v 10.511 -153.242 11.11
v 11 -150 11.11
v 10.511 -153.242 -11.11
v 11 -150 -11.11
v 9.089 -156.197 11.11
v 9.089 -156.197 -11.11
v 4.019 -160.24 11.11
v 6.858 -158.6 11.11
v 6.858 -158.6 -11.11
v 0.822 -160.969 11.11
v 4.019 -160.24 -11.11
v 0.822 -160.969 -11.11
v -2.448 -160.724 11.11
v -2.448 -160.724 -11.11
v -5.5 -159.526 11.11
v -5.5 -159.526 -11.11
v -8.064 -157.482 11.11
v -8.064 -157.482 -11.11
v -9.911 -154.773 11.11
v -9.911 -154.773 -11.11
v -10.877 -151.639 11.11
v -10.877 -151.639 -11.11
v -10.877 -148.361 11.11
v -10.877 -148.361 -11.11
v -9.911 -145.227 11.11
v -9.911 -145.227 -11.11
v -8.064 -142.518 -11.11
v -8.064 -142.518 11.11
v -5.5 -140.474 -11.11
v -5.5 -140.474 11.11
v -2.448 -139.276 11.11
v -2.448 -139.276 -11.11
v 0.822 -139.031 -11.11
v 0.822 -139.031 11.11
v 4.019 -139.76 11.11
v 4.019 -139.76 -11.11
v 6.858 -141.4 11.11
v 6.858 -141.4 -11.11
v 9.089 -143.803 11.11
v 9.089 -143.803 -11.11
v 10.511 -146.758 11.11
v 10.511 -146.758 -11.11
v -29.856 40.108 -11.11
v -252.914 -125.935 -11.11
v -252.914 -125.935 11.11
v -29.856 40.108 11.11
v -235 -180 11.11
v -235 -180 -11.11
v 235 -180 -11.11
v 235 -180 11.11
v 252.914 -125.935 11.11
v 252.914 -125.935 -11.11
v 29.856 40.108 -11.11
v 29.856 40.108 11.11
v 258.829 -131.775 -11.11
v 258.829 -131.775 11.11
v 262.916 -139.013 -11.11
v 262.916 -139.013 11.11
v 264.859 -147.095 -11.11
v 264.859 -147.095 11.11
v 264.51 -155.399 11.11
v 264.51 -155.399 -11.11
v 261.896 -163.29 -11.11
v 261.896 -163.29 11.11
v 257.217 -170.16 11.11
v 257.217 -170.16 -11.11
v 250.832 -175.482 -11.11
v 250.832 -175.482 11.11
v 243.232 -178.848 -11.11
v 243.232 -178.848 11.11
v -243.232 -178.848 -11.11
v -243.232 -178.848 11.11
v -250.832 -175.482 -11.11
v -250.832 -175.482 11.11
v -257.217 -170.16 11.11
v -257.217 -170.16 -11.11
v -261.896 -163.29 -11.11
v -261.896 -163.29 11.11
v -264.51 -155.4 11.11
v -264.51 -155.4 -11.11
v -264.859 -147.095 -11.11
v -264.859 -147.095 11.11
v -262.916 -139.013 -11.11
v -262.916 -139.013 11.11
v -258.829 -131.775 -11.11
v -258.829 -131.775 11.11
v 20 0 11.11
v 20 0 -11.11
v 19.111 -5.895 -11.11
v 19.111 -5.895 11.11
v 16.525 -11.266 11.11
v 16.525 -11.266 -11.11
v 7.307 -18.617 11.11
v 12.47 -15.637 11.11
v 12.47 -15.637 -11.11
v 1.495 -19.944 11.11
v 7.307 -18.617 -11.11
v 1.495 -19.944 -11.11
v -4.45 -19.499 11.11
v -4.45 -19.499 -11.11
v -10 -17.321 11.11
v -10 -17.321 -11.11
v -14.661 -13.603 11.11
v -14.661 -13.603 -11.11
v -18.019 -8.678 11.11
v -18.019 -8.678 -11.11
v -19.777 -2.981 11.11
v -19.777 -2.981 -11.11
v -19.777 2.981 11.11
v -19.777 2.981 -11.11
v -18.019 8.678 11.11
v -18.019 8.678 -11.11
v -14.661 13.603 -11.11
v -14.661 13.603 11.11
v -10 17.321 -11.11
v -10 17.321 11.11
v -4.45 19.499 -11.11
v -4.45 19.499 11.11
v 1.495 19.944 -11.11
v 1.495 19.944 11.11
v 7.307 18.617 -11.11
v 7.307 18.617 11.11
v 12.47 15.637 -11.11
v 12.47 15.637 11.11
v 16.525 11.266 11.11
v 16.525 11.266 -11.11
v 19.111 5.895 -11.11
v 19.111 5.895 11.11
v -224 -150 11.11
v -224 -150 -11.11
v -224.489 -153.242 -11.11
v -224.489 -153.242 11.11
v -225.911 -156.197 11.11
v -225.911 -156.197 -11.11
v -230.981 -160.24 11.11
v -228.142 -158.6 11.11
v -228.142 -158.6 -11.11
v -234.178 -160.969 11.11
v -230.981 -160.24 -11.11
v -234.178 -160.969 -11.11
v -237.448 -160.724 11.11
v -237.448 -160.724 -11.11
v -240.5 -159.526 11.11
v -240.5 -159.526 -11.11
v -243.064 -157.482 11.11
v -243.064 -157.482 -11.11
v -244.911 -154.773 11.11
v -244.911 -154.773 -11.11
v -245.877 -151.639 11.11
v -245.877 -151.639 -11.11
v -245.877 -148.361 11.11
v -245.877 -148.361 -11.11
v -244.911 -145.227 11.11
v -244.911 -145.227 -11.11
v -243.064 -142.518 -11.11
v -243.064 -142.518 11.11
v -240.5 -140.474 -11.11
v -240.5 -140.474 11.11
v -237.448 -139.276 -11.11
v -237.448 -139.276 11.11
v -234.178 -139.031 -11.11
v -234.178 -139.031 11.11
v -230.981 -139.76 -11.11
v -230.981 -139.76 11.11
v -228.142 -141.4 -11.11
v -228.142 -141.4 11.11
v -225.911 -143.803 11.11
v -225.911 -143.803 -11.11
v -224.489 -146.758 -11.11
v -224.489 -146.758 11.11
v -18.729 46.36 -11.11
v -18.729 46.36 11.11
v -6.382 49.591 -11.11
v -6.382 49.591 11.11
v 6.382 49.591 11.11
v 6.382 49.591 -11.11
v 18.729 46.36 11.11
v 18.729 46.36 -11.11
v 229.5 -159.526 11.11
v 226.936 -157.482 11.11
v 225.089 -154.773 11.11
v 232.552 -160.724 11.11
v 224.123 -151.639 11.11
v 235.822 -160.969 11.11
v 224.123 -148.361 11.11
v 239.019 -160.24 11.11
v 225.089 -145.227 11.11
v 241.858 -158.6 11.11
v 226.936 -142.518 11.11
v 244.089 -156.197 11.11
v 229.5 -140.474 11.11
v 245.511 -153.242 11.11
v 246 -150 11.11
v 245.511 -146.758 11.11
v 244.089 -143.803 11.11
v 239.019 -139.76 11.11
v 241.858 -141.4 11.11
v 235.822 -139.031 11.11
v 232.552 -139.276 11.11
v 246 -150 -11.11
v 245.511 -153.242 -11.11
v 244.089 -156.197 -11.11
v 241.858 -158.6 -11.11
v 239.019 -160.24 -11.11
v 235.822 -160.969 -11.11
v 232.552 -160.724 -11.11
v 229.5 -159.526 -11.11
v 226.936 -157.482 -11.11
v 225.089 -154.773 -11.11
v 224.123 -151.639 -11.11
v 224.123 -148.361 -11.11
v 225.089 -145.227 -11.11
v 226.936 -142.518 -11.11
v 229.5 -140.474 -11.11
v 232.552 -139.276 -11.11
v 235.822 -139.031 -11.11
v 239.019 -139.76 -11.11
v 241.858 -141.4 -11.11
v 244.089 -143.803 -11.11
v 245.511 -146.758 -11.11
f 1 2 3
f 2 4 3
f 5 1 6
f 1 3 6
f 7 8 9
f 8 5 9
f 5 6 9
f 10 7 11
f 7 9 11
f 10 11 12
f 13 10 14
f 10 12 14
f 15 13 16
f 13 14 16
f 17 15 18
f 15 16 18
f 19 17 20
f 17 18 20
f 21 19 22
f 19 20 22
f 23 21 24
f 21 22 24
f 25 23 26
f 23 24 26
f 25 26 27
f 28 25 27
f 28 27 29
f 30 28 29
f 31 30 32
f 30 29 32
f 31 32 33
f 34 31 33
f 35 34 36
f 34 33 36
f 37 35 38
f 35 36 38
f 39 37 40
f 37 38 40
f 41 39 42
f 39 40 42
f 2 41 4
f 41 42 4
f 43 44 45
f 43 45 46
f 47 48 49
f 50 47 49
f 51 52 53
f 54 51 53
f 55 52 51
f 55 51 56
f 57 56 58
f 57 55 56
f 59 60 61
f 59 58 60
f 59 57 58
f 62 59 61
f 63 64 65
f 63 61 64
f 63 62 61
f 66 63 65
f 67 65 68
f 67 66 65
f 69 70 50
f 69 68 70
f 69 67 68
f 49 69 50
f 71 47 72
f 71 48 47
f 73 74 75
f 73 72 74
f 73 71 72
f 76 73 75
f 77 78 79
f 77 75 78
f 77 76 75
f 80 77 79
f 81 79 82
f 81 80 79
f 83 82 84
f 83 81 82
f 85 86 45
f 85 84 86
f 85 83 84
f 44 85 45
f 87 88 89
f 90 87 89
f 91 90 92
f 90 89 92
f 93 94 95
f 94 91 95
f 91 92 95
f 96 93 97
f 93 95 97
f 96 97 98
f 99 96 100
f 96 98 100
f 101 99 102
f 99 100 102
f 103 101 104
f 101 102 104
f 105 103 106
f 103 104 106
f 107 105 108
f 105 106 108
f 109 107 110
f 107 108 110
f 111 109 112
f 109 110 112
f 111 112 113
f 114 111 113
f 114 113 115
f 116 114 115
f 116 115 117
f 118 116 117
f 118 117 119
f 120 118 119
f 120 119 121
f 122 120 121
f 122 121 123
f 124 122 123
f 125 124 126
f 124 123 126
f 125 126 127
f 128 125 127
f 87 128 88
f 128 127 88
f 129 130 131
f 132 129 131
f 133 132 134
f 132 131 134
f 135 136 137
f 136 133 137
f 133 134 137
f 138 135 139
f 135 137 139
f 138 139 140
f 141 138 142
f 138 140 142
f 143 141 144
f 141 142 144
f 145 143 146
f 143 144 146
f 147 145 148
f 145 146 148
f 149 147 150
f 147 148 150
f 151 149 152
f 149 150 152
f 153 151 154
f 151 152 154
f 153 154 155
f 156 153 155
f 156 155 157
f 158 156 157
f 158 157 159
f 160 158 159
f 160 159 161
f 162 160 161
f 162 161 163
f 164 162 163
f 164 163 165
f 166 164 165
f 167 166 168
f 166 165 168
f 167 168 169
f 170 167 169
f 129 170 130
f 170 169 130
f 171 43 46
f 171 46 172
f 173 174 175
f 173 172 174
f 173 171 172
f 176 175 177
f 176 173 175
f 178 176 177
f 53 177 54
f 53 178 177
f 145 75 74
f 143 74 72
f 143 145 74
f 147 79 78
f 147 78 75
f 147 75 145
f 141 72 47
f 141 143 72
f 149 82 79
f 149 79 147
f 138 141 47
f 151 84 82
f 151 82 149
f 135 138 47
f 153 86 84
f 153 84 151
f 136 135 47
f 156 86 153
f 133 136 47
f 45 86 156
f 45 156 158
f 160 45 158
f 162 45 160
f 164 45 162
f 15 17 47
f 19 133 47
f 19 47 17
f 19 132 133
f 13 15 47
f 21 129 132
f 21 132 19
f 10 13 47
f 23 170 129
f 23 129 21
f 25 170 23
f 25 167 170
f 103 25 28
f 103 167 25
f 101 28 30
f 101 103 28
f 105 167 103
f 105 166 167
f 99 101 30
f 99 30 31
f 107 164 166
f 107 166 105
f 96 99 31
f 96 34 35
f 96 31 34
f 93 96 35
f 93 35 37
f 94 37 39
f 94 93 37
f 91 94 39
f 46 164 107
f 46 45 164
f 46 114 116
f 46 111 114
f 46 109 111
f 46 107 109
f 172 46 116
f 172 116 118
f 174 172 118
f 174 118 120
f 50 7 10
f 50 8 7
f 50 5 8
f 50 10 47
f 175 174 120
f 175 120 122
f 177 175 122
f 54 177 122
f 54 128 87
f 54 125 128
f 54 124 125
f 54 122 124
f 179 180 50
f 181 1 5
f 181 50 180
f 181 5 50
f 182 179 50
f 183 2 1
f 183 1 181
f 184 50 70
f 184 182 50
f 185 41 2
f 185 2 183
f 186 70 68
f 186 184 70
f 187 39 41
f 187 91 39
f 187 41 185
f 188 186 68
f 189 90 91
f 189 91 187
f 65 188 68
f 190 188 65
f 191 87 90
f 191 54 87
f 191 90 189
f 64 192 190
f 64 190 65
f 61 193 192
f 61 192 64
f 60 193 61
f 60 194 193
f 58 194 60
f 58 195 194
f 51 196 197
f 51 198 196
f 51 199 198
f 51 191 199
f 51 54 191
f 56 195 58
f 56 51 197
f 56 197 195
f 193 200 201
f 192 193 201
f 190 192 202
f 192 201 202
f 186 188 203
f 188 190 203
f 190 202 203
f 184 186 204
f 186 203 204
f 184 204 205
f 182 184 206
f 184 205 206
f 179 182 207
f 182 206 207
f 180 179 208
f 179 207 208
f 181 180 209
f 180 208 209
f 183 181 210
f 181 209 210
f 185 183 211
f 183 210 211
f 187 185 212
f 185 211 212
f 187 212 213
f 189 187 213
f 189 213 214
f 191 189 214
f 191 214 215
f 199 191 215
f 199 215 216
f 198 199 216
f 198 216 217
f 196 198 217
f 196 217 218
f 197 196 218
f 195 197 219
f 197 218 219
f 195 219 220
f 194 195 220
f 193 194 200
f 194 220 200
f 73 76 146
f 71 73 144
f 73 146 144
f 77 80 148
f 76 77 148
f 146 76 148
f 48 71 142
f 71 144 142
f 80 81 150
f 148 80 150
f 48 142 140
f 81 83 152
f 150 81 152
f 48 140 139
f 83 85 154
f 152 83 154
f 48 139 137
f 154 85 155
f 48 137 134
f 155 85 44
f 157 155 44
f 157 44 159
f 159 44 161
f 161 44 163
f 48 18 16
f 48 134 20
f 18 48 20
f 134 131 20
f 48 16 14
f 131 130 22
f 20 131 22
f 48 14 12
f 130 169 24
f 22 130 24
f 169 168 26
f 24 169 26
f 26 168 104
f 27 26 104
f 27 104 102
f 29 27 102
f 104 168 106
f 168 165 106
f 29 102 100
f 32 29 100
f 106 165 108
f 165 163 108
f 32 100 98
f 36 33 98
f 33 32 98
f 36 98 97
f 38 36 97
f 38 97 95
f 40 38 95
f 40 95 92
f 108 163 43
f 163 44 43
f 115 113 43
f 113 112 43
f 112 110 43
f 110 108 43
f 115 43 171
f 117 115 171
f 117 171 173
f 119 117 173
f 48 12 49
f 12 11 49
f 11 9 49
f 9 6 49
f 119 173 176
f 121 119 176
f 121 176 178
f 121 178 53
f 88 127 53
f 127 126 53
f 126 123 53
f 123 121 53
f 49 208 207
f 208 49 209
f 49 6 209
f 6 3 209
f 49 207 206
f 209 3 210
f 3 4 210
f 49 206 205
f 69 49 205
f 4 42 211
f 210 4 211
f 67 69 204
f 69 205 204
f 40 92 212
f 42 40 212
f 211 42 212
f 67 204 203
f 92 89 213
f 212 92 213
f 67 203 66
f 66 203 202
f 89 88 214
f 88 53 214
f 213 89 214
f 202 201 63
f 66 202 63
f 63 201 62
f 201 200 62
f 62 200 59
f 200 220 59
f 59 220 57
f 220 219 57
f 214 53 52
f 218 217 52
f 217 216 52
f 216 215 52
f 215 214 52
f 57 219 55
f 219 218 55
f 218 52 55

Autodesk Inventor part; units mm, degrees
ref_plane "YZ Plane" through (0, 0, 0) normal (1, 0, 0) x (0, 1, 0)
ref_plane "XZ Plane" through (0, 0, 0) normal (0, 1, 0) x (-1, 0, 0)
ref_plane "XY Plane" through (0, 0, 0) normal (0, 0, 1) x (1, 0, 0)
sketch "Sketch1" plane through (0, 0, 0) normal (0, 0, 1) x (1, 0, 0)
  circle A0 centre (0, 0) radius 20
  circle A1 centre (-235, -150) radius 11
  circle A2 centre (0, -150) radius 11
  arc A3 (-252.9136, -125.9354) -> (-235, -180) centre (-235, -150) ccw
  line L0 (0, 87.1559) -> (0, -290.9336) construction
  circle A4 centre (235, -150) radius 11
  arc A5 (235, -180) -> (252.9136, -125.9354) centre (235, -150) ccw
  line L1 (-235, -180) -> (235, -180)
  arc A6 (29.8559, 40.1076) -> (-29.8559, 40.1076) centre (0, 0) ccw
  line L2 (-252.9136, -125.9354) -> (-29.8559, 40.1076)
  line L3 (252.9136, -125.9354) -> (29.8559, 40.1076)
  point P0 (0, -180)
  point P1 (0, 46.2314)
  dimension "d0" = 40
  dimension "d1" = 22
  dimension "d3" = 22
  dimension "d4" = 150
  dimension "d8" = 235
  dimension "d16" = 470
  dimension "d17" = 30
  dimension "d18" = 100
extrude "Extrusion1" add sketch "Sketch1" along normal mid plane 22.22
equation "\"d1\" = d3"
properties part number "Corpo_Suporte_3_Cabos_Modelo1"
